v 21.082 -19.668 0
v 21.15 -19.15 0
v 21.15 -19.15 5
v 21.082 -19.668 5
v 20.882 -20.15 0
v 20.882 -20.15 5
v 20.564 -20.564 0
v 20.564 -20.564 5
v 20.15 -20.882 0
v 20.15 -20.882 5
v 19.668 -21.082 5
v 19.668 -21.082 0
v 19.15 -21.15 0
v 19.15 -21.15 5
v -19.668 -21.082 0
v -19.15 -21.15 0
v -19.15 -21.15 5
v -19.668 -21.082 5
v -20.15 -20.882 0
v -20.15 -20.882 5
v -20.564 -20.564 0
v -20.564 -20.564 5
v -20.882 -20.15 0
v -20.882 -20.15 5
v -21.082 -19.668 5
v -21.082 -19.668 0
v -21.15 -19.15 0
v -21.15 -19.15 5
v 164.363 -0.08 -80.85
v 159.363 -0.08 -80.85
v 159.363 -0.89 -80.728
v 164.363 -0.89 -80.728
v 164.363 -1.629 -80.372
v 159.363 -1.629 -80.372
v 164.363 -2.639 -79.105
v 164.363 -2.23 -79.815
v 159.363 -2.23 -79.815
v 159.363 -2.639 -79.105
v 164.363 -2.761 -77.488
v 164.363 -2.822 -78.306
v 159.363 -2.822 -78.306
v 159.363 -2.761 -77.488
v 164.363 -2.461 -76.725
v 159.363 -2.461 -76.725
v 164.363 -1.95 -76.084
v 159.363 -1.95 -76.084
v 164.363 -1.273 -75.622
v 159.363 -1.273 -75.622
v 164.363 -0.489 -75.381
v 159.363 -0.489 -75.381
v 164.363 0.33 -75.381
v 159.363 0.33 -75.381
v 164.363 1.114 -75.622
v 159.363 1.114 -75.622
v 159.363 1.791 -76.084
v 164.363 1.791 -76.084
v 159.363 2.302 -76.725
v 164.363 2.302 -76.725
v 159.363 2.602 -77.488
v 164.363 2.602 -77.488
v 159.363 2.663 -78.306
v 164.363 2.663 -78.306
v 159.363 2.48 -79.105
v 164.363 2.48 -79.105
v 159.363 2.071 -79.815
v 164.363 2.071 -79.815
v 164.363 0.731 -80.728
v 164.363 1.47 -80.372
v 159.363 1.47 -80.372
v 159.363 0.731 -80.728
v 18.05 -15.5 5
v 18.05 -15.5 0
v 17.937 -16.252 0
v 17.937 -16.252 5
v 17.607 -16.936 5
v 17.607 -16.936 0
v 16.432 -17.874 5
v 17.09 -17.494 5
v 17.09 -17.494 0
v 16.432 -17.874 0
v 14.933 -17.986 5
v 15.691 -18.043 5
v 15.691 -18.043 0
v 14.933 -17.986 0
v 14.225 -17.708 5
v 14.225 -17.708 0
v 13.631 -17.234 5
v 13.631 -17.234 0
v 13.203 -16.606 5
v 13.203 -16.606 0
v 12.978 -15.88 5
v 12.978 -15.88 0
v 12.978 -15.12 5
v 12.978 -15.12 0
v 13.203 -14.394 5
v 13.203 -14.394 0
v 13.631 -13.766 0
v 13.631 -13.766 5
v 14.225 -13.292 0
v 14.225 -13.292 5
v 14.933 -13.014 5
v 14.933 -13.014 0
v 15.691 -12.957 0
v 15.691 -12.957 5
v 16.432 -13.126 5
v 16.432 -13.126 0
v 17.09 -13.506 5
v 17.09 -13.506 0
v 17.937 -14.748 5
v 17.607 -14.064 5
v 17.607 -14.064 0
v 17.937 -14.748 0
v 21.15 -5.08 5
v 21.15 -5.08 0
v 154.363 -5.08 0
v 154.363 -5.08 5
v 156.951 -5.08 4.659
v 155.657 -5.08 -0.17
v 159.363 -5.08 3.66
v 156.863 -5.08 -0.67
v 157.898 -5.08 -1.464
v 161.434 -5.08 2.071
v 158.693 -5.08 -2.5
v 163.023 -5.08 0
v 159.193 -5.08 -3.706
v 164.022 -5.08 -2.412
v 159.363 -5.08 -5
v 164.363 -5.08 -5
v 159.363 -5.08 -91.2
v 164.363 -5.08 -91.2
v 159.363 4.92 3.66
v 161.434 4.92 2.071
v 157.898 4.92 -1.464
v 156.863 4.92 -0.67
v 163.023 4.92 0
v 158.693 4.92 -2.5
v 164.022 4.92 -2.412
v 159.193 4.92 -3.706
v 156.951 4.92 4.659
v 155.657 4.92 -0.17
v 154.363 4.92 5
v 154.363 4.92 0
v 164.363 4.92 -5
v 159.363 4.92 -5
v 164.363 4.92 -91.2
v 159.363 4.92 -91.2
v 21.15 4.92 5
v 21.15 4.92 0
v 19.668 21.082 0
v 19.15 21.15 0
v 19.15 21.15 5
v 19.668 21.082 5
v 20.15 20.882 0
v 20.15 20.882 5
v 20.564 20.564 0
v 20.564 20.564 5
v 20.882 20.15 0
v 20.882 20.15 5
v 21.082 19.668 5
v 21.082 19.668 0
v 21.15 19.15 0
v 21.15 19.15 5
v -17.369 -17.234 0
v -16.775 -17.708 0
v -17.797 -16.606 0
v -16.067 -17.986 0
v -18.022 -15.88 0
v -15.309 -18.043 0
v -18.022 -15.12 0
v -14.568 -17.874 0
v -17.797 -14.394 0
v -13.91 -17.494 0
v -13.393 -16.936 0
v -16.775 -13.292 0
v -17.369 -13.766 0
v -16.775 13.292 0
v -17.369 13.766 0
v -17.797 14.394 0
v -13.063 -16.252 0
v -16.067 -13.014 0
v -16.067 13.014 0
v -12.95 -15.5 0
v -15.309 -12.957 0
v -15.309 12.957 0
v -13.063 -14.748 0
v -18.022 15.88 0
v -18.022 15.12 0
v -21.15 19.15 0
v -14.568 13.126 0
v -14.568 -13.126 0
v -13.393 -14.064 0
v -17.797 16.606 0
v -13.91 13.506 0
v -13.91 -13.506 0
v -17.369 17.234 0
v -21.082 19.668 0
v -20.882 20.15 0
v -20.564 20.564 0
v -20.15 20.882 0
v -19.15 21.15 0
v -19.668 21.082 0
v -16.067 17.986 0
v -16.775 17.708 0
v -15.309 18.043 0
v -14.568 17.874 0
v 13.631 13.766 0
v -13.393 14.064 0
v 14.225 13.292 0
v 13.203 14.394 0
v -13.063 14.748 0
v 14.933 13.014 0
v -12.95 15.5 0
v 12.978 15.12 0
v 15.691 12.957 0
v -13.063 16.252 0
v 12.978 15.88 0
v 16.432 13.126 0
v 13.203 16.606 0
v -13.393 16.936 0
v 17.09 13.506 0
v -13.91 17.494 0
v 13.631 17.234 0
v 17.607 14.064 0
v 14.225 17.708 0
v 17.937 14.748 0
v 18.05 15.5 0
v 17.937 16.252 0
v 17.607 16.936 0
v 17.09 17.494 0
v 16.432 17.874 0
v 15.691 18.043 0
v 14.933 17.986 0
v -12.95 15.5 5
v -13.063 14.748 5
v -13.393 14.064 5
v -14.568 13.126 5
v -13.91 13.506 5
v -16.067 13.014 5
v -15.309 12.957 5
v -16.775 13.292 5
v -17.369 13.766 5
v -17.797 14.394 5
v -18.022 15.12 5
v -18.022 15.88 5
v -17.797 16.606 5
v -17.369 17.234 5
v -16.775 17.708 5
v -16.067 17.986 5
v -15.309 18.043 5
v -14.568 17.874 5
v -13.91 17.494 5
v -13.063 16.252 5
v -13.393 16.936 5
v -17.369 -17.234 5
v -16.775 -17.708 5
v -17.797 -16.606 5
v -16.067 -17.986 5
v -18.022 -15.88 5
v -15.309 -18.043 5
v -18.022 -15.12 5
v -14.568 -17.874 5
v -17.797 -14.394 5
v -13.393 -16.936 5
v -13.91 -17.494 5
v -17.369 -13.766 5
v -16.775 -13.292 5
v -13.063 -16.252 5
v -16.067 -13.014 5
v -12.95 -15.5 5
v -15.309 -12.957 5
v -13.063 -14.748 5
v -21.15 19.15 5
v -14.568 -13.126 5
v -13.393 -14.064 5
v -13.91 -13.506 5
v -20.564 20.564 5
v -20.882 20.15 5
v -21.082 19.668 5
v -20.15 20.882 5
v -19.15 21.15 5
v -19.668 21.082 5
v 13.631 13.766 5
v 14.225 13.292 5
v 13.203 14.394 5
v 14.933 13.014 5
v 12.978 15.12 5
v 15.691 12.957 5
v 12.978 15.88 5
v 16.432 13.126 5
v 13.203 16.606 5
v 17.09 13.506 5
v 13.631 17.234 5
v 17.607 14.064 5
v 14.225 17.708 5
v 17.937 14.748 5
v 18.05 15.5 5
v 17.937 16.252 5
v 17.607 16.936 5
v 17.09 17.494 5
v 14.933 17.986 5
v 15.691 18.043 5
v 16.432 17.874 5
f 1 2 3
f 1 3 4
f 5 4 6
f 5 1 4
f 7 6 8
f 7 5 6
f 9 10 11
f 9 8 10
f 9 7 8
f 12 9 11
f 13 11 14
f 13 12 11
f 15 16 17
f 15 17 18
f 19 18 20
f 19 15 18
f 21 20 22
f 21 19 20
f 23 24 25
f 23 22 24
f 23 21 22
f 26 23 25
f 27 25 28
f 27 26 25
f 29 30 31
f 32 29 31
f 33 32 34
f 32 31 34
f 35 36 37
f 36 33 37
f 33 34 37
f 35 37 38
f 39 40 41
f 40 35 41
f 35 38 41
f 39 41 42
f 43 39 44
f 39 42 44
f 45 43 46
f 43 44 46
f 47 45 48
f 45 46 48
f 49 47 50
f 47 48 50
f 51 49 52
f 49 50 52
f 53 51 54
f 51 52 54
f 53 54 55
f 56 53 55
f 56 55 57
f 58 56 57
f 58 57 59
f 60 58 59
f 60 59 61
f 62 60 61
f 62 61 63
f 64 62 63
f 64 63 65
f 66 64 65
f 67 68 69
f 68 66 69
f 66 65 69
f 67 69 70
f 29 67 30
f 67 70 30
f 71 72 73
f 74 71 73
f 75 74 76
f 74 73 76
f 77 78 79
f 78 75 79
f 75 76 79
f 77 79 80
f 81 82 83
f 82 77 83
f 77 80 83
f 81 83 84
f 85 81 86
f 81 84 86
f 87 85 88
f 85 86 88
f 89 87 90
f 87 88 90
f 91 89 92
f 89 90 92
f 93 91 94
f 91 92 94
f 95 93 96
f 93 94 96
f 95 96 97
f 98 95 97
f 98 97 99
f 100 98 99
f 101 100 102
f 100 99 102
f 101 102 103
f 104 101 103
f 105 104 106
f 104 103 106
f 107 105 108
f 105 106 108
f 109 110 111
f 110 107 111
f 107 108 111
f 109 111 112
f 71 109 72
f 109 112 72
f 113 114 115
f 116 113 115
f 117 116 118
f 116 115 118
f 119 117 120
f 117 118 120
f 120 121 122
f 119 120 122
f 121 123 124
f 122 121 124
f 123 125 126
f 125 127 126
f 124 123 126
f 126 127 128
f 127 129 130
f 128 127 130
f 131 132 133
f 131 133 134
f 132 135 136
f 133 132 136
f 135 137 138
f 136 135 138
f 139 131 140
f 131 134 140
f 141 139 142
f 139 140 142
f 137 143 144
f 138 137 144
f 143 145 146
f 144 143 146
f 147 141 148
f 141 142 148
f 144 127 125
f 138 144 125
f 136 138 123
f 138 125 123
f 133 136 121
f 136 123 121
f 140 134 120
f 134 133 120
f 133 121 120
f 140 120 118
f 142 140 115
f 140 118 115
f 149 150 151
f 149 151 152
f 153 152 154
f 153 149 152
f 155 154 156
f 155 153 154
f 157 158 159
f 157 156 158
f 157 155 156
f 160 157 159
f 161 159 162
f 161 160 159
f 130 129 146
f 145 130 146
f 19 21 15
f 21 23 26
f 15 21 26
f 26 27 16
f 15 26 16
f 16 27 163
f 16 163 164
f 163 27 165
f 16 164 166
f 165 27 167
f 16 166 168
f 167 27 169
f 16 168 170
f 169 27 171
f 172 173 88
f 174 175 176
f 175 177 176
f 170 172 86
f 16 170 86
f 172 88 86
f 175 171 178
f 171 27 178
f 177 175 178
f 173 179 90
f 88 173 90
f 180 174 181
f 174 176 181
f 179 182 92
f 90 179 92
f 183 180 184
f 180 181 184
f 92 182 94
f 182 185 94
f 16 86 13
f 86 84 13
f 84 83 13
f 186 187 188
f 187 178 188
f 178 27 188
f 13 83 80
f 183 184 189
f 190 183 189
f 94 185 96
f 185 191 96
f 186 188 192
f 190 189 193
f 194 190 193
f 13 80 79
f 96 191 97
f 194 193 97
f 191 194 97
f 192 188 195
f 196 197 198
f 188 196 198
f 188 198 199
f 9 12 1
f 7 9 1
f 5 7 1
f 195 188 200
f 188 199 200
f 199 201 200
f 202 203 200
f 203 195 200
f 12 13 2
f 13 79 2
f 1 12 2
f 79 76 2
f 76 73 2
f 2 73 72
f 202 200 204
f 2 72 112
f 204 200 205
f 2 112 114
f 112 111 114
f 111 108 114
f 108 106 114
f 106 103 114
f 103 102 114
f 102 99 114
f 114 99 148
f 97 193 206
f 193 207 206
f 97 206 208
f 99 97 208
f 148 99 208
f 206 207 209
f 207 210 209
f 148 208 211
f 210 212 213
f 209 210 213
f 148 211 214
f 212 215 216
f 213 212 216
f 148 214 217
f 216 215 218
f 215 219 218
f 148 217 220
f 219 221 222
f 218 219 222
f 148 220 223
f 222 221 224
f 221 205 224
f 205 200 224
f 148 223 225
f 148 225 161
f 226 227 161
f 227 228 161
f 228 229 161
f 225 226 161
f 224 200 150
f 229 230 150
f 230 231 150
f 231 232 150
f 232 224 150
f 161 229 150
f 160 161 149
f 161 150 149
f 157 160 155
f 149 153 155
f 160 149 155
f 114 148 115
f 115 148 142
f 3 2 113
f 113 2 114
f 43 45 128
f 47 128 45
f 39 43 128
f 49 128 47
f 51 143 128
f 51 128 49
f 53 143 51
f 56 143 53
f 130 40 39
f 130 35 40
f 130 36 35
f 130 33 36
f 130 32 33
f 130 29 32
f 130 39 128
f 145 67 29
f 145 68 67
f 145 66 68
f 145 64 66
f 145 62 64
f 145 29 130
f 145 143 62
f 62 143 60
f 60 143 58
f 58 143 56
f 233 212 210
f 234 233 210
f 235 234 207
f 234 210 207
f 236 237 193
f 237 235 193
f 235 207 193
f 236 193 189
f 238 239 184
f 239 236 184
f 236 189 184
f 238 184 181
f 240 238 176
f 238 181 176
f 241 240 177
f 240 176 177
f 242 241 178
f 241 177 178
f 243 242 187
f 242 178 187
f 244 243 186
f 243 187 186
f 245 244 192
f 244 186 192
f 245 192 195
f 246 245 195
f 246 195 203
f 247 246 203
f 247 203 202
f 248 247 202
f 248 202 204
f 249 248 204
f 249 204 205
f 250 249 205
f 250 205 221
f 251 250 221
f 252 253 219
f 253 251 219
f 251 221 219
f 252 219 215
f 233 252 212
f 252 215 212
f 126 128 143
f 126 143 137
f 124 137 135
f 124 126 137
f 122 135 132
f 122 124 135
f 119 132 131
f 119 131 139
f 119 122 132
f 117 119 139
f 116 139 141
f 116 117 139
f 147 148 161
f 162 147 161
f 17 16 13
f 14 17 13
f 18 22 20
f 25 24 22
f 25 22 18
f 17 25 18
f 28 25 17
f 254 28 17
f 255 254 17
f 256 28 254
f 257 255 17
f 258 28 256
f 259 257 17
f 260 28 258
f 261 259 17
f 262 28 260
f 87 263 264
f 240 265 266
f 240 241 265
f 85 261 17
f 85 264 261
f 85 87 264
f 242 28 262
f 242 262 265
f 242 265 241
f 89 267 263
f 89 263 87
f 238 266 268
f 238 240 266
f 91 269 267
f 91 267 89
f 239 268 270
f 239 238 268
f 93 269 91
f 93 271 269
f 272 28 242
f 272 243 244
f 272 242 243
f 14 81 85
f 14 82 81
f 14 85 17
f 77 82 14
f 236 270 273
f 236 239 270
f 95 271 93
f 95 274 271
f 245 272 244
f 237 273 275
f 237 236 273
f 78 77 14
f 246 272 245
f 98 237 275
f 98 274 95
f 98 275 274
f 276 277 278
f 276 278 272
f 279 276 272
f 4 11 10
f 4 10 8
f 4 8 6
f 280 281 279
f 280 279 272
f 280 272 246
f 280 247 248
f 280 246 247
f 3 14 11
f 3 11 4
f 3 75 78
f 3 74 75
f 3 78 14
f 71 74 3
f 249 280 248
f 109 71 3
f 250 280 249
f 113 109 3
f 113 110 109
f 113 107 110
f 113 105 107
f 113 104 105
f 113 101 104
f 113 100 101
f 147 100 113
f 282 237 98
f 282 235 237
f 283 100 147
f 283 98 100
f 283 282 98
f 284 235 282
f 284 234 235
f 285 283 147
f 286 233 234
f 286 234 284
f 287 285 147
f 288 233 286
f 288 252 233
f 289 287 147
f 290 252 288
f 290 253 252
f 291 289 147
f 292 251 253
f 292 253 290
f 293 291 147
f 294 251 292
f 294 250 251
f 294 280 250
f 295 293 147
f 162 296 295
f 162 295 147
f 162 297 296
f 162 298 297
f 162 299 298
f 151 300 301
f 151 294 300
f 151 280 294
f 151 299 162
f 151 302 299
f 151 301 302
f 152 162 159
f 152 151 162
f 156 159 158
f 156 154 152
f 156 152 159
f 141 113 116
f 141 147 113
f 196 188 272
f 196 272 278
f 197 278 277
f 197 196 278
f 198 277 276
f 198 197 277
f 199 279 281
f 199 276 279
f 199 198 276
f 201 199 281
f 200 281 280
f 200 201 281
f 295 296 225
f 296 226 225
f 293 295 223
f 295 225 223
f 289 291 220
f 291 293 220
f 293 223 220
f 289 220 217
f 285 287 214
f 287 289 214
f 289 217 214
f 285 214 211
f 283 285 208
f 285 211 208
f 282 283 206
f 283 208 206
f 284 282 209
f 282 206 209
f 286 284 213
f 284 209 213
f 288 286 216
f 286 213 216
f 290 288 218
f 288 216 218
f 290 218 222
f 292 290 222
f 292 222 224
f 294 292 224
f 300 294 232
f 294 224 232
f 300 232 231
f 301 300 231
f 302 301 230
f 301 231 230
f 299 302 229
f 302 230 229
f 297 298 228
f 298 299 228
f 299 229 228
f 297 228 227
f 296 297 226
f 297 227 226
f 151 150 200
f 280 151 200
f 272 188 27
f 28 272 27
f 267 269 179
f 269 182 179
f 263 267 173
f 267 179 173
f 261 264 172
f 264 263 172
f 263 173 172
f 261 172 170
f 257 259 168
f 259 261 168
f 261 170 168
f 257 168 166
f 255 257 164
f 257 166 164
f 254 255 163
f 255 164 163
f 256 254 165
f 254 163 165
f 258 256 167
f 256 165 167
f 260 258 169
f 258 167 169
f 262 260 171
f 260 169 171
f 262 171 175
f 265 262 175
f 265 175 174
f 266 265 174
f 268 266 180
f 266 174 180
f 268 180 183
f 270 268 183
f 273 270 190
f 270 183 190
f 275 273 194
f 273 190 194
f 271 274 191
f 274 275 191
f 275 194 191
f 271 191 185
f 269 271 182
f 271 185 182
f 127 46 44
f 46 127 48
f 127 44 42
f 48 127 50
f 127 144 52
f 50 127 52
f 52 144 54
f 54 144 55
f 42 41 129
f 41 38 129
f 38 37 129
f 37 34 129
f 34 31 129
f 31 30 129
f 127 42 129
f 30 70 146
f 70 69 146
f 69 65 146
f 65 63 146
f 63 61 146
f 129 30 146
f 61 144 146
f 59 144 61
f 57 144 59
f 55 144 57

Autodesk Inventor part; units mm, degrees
ref_plane "YZ Plane" through (0, 0, 0) normal (1, 0, 0) x (0, 1, 0)
ref_plane "XZ Plane" through (0, 0, 0) normal (0, 1, 0) x (-1, 0, 0)
ref_plane "XY Plane" through (0, 0, 0) normal (0, 0, 1) x (1, 0, 0)
sketch "Sketch1" plane through (0, 0, 0) normal (0, 0, 1) x (1, 0, 0)
  line L0 (-21.15, 19.15) -> (-21.15, -19.15)
  line L1 (21.15, -19.15) -> (21.15, 19.15)
  line L2 (19.15, 21.15) -> (-19.15, 21.15)
  line L3 (-19.15, -21.15) -> (19.15, -21.15)
  line L4 (159.3629, -5.0795) -> (159.3629, 4.9205)
  line L5 (159.3629, -5.0795) -> (159.3629, 4.9205)
  line L6 (159.3629, 4.9205) -> (138.2729, 4.9205)
  line L7 (138.2729, -5.0795) -> (159.3629, -5.0795)
  circle A0 centre (-15.5, -15.5) radius 2.55
  circle A1 centre (15.5, 15.5) radius 2.55
  circle A2 centre (-15.5, 15.5) radius 2.55
  circle A3 centre (15.5, -15.5) radius 2.55
  line L8 (-21.15, -19.15) -> (-21.15, 19.15)
  line L9 (-19.15, 21.15) -> (19.15, 21.15)
  line L10 (21.15, 19.15) -> (21.15, -19.15)
  line L11 (19.15, -21.15) -> (-19.15, -21.15)
  arc A4 (-21.15, -19.15) -> (-19.15, -21.15) centre (-19.15, -19.15) ccw
  arc A5 (-19.15, 21.15) -> (-21.15, 19.15) centre (-19.15, 19.15) ccw
  arc A6 (21.15, 19.15) -> (19.15, 21.15) centre (19.15, 19.15) ccw
  arc A7 (19.15, -21.15) -> (21.15, -19.15) centre (19.15, -19.15) ccw
  circle A8 centre (-15.5, -15.5) radius 2.55
  circle A9 centre (-15.5, 15.5) radius 2.55
  circle A10 centre (15.5, 15.5) radius 2.55
  circle A11 centre (15.5, -15.5) radius 2.55
  line L12 (159.3629, -5.0795) -> (21.15, -5.0795)
  line L13 (159.3629, -5.0795) -> (159.3629, 4.9205)
  line L14 (159.3629, 4.9205) -> (21.15, 4.9205)
  point P0 (0, 0)
  dimension "d0" = 2
sketch "Sketch2" plane through (159.3629, -5.0795, 0) normal (1, 0, 0) x (0, 0, -1)
  line L0 (91.2, 0) -> (91.2, 10)
  line L1 (65, 0) -> (65, 10)
  circle A0 centre (78.1, 5) radius 2.75
  line L2 (-5, 10) -> (-5, 0)
  line L3 (0, 10) -> (-5, 10)
  line L4 (0, 0) -> (-5, 0)
  line L5 (-5, 10) -> (91.2, 10)
  line L6 (91.2, 10) -> (91.2, 0)
  line L7 (91.2, 0) -> (-5, 0)
  line L8 (-5, 0) -> (-5, 10)
  circle A1 centre (78.1, 5) radius 2.75
  point P0 (0, 5.0795)
extrude "Plate1" add sketch "Sketch1" along normal blind 5
sheet face with bend "Face2" sketch "Sketch2" thickness 5 toward (1, 0, 0) bend radius 5
bend "Bend1"
equation "\"d1\" = Thickness"
equation "\"d2\" = BendRadius"
equation "\"d3\" = BendReliefWidth"
equation "\"d5\" = MinimumRemnant"
equation "\"d4\" = BendReliefDepth"
equation "\"d6\" = TransitionRadius"
equation "\"BendRadius\" = Thickness"
equation "\"BendReliefWidth\" = Thickness"
equation "\"BendReliefDepth\" = 0.5 * Thickness"
equation "\"TransitionRadius\" = BendRadius"
equation "\"JacobiRadiusSize\" = BendRadius"
equation "\"GapSize\" = Thickness"
equation "\"Thickness\" = 5"
equation "\"MinimumRemnant\" = 10"
properties part number "corredera"
